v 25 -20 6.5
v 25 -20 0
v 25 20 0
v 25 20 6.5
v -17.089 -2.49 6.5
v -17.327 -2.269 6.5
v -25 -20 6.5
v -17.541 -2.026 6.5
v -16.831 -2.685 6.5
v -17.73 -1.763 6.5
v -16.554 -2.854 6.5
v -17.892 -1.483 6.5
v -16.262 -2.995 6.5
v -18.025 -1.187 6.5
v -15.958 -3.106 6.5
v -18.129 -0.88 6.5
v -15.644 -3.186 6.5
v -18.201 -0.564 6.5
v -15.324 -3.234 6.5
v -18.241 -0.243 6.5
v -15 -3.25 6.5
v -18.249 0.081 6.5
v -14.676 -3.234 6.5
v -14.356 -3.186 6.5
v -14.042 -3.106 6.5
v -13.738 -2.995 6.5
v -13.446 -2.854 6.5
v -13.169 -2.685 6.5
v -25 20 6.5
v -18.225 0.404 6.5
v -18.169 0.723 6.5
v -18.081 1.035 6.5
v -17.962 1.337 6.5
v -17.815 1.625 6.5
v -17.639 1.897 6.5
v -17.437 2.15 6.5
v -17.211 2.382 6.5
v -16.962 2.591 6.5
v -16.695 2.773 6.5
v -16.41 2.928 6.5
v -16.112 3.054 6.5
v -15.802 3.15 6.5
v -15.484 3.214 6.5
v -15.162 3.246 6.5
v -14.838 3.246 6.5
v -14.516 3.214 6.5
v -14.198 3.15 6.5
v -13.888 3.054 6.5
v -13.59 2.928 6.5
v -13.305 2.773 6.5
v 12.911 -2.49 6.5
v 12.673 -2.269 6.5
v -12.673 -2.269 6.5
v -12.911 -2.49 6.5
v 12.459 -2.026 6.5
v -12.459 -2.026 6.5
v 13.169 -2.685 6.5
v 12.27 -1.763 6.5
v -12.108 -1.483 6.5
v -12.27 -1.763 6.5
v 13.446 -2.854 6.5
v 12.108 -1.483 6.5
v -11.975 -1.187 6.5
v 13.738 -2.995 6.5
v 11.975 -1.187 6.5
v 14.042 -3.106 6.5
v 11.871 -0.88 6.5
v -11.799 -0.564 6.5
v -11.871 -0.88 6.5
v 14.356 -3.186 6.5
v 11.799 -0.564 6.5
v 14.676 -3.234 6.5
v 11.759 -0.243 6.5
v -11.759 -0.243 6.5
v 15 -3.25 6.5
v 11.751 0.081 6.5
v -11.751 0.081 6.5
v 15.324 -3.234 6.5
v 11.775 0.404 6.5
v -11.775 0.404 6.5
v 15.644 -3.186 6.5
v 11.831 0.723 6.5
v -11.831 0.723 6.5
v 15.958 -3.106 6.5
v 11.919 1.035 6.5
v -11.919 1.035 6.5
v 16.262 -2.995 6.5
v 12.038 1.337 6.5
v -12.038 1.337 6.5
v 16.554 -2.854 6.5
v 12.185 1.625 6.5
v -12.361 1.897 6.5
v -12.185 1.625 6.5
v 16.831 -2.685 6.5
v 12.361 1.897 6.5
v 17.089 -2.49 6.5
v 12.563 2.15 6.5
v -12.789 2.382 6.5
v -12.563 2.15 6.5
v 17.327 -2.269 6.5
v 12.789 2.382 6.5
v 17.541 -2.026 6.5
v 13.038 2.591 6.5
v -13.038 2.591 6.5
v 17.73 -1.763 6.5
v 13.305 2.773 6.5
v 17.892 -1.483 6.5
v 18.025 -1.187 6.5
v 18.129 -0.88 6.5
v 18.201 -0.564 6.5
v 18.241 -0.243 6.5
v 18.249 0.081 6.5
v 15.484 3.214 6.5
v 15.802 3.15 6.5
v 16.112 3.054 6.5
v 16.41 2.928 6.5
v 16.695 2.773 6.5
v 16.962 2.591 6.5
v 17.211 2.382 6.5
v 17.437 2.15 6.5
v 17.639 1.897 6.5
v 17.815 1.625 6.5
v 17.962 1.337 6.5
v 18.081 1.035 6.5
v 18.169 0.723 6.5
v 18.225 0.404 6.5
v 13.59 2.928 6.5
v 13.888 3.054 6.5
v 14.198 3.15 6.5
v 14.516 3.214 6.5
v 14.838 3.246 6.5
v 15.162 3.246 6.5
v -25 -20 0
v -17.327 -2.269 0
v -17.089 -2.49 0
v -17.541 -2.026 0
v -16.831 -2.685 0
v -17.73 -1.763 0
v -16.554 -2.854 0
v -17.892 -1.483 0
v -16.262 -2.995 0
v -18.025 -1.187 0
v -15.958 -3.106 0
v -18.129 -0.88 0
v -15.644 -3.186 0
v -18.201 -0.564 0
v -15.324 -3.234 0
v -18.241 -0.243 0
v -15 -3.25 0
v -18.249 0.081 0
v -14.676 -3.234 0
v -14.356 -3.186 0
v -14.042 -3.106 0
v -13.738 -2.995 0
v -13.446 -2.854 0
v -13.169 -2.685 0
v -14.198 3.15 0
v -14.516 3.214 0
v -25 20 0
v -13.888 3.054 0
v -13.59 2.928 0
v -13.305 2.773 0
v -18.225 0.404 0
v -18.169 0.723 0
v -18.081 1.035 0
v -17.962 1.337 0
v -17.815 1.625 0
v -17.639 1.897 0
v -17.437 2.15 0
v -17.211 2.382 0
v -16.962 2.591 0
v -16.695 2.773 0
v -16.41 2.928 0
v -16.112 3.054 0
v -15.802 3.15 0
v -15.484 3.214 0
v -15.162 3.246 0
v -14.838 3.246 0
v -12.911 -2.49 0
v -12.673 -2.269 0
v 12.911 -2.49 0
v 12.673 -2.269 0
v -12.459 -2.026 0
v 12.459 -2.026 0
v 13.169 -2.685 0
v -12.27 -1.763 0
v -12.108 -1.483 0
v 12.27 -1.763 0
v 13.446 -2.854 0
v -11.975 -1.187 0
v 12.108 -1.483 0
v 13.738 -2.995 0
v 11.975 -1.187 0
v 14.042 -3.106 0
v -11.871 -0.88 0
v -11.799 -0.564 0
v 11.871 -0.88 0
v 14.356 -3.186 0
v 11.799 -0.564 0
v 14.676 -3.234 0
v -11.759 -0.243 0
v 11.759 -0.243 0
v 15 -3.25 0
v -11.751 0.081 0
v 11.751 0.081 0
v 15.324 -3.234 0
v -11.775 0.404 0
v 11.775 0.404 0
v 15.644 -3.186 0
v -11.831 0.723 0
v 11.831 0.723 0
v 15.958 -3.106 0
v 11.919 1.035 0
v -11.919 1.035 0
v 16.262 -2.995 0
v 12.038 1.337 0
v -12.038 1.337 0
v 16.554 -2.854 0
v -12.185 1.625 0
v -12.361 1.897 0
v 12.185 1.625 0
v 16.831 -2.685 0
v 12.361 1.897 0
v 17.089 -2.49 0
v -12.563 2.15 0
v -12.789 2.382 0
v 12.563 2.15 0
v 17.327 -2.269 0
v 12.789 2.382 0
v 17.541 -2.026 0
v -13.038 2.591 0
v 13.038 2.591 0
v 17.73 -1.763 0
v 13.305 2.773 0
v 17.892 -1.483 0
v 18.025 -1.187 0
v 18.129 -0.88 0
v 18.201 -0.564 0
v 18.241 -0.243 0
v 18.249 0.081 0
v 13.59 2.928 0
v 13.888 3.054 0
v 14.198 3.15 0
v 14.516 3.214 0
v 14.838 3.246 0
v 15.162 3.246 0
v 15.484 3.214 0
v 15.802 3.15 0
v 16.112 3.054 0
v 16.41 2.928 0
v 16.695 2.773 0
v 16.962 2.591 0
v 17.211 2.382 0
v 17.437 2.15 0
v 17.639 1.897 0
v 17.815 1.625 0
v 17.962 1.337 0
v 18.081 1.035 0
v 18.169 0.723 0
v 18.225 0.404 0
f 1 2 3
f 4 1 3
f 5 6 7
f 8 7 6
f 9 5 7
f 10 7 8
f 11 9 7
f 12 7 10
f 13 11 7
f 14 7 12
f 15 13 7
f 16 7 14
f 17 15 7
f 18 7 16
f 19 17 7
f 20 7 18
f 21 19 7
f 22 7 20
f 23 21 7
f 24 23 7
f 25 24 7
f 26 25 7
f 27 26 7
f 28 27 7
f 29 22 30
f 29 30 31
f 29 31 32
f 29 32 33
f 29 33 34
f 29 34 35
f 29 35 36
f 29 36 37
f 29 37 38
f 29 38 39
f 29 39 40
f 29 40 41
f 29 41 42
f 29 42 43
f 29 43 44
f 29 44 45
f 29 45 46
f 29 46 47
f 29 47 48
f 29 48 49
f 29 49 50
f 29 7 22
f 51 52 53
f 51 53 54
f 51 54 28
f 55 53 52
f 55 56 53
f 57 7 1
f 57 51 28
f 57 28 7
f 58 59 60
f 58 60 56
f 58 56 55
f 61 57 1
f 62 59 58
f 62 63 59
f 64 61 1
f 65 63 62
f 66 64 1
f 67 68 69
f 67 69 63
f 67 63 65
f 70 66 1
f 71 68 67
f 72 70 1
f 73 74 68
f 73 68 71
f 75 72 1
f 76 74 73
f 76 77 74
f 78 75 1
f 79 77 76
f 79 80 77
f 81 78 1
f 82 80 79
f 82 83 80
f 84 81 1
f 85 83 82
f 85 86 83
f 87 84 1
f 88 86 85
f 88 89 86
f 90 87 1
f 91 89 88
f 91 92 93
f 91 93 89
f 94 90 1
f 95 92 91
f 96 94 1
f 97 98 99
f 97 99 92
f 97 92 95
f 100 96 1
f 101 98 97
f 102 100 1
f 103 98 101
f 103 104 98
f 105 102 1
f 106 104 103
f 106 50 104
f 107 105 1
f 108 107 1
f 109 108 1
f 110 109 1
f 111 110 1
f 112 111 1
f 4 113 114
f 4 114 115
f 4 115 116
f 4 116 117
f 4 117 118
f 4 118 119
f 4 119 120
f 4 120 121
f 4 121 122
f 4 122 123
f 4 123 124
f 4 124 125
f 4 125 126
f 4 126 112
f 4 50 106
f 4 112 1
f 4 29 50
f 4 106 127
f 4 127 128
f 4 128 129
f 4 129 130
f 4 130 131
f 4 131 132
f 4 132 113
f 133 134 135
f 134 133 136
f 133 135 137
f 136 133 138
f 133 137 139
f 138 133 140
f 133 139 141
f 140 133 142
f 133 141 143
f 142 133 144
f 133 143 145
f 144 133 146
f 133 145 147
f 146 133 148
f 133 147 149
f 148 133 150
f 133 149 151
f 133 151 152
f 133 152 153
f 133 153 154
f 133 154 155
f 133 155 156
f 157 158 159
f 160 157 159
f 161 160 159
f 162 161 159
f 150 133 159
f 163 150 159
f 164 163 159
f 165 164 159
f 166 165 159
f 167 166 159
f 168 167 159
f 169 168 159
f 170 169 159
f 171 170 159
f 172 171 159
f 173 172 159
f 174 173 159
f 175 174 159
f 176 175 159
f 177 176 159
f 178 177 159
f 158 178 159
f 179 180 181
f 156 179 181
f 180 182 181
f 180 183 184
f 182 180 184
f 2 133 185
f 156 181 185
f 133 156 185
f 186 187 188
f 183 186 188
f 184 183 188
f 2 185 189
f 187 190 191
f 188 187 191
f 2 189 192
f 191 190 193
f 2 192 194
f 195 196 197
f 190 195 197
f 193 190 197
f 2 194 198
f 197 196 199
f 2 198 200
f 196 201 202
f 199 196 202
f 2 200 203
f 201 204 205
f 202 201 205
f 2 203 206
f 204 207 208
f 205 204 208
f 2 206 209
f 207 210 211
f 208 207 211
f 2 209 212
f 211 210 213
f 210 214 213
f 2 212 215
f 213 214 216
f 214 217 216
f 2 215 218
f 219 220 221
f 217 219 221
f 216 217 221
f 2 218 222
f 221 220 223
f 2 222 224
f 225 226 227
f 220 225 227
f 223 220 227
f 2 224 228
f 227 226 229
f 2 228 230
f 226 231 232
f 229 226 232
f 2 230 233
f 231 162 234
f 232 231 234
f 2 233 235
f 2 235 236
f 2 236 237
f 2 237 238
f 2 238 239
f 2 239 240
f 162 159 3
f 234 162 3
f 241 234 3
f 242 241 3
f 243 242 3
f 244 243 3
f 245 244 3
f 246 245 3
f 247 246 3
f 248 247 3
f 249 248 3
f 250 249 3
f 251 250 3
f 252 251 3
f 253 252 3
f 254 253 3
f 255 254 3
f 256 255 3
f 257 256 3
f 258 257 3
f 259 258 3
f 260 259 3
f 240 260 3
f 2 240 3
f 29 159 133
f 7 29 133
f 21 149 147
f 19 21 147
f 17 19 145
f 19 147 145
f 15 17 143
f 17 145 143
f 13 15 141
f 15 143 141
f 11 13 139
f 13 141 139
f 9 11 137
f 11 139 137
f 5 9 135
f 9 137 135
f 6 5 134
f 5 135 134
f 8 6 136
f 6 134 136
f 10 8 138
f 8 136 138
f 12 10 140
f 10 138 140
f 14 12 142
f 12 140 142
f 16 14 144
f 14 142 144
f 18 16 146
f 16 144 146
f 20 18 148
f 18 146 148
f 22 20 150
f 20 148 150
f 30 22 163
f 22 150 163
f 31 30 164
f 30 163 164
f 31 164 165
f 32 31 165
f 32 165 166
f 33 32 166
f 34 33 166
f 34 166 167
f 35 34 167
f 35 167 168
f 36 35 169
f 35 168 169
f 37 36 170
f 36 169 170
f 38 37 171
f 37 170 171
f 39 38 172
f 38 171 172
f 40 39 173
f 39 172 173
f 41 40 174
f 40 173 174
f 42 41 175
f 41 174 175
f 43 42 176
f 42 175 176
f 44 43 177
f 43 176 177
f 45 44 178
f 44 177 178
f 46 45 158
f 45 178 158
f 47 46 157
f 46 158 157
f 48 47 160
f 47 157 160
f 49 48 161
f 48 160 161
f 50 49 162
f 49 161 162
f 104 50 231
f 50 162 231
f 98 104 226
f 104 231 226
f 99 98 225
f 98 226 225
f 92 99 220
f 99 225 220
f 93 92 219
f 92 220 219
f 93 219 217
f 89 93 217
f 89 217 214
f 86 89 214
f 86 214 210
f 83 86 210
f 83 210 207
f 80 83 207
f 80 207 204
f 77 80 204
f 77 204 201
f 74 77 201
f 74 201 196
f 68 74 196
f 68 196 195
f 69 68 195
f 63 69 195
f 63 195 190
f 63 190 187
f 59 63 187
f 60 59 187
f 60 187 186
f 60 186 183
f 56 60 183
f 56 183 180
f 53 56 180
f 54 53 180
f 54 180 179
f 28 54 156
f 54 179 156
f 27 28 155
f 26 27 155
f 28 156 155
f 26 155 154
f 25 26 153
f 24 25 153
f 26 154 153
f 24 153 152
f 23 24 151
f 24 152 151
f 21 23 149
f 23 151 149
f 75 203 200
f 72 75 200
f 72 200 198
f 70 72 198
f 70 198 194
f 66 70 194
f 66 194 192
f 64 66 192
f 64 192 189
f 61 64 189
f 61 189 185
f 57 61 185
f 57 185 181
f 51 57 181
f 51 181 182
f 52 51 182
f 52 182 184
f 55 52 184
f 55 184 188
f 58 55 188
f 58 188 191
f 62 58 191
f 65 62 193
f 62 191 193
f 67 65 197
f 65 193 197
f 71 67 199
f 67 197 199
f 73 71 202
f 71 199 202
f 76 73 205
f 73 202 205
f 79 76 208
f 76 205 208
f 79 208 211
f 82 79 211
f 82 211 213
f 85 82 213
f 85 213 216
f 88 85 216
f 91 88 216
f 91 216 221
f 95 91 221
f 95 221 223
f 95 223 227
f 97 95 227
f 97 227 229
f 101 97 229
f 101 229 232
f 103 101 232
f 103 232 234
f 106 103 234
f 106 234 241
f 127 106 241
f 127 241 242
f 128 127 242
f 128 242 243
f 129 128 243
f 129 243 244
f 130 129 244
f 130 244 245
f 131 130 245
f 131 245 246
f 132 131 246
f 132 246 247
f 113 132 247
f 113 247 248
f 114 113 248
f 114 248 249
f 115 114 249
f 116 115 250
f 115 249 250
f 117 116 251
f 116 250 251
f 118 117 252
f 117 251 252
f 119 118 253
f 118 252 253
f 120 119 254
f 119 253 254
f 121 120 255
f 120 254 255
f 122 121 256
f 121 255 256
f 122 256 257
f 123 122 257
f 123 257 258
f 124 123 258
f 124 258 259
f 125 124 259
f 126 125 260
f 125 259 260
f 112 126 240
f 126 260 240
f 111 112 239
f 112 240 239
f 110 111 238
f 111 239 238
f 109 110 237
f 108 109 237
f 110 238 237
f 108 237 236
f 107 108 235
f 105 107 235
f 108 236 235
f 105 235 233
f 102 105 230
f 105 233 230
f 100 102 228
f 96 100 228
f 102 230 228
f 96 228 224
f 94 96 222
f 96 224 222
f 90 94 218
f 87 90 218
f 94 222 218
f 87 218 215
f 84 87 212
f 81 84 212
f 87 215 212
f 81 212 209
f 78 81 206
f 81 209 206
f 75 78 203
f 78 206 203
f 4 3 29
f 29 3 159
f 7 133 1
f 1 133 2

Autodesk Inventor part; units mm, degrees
ref_plane "YZ Plane" through (0, 0, 0) normal (1, 0, 0) x (0, 1, 0)
ref_plane "XZ Plane" through (0, 0, 0) normal (0, 1, 0) x (-1, 0, 0)
ref_plane "XY Plane" through (0, 0, 0) normal (0, 0, 1) x (1, 0, 0)
sketch "Sketch1" plane through (0, 0, 0) normal (0, 0, 1) x (1, 0, 0)
  line L0 (-25, -20) -> (25, -20)
  line L1 (25, -20) -> (25, 20)
  line L2 (25, 20) -> (-25, 20)
  line L3 (-25, 20) -> (-25, -20)
  point P0 (0, 0)
  dimension "d0" = 50
  dimension "d1" = 40
extrude "Extrusion1" add sketch "Sketch1" along normal blind 6.5
sketch "Sketch2" plane through (0, 0, 6.5) normal (0, 0, 1) x (1, 0, 0)
  circle A0 centre (-15, 0) radius 3.25
  point P0 (0, 0)
  dimension "d4" = 6.5
hole "Hole1" at (-15, 0, 6.5) direction (0, 0, -1) diameter 6.5 end through all
sketch "Sketch3" plane through (0, 0, 6.5) normal (0, 0, 1) x (1, 0, 0)
  circle A0 centre (15, 0) radius 3.25
  point P0 (0, 0)
  dimension "d12" = 6.5
hole "Hole2" at (15, 0, 6.5) direction (0, 0, -1) diameter 6.5 end through all
properties part number "Bed Plate"
